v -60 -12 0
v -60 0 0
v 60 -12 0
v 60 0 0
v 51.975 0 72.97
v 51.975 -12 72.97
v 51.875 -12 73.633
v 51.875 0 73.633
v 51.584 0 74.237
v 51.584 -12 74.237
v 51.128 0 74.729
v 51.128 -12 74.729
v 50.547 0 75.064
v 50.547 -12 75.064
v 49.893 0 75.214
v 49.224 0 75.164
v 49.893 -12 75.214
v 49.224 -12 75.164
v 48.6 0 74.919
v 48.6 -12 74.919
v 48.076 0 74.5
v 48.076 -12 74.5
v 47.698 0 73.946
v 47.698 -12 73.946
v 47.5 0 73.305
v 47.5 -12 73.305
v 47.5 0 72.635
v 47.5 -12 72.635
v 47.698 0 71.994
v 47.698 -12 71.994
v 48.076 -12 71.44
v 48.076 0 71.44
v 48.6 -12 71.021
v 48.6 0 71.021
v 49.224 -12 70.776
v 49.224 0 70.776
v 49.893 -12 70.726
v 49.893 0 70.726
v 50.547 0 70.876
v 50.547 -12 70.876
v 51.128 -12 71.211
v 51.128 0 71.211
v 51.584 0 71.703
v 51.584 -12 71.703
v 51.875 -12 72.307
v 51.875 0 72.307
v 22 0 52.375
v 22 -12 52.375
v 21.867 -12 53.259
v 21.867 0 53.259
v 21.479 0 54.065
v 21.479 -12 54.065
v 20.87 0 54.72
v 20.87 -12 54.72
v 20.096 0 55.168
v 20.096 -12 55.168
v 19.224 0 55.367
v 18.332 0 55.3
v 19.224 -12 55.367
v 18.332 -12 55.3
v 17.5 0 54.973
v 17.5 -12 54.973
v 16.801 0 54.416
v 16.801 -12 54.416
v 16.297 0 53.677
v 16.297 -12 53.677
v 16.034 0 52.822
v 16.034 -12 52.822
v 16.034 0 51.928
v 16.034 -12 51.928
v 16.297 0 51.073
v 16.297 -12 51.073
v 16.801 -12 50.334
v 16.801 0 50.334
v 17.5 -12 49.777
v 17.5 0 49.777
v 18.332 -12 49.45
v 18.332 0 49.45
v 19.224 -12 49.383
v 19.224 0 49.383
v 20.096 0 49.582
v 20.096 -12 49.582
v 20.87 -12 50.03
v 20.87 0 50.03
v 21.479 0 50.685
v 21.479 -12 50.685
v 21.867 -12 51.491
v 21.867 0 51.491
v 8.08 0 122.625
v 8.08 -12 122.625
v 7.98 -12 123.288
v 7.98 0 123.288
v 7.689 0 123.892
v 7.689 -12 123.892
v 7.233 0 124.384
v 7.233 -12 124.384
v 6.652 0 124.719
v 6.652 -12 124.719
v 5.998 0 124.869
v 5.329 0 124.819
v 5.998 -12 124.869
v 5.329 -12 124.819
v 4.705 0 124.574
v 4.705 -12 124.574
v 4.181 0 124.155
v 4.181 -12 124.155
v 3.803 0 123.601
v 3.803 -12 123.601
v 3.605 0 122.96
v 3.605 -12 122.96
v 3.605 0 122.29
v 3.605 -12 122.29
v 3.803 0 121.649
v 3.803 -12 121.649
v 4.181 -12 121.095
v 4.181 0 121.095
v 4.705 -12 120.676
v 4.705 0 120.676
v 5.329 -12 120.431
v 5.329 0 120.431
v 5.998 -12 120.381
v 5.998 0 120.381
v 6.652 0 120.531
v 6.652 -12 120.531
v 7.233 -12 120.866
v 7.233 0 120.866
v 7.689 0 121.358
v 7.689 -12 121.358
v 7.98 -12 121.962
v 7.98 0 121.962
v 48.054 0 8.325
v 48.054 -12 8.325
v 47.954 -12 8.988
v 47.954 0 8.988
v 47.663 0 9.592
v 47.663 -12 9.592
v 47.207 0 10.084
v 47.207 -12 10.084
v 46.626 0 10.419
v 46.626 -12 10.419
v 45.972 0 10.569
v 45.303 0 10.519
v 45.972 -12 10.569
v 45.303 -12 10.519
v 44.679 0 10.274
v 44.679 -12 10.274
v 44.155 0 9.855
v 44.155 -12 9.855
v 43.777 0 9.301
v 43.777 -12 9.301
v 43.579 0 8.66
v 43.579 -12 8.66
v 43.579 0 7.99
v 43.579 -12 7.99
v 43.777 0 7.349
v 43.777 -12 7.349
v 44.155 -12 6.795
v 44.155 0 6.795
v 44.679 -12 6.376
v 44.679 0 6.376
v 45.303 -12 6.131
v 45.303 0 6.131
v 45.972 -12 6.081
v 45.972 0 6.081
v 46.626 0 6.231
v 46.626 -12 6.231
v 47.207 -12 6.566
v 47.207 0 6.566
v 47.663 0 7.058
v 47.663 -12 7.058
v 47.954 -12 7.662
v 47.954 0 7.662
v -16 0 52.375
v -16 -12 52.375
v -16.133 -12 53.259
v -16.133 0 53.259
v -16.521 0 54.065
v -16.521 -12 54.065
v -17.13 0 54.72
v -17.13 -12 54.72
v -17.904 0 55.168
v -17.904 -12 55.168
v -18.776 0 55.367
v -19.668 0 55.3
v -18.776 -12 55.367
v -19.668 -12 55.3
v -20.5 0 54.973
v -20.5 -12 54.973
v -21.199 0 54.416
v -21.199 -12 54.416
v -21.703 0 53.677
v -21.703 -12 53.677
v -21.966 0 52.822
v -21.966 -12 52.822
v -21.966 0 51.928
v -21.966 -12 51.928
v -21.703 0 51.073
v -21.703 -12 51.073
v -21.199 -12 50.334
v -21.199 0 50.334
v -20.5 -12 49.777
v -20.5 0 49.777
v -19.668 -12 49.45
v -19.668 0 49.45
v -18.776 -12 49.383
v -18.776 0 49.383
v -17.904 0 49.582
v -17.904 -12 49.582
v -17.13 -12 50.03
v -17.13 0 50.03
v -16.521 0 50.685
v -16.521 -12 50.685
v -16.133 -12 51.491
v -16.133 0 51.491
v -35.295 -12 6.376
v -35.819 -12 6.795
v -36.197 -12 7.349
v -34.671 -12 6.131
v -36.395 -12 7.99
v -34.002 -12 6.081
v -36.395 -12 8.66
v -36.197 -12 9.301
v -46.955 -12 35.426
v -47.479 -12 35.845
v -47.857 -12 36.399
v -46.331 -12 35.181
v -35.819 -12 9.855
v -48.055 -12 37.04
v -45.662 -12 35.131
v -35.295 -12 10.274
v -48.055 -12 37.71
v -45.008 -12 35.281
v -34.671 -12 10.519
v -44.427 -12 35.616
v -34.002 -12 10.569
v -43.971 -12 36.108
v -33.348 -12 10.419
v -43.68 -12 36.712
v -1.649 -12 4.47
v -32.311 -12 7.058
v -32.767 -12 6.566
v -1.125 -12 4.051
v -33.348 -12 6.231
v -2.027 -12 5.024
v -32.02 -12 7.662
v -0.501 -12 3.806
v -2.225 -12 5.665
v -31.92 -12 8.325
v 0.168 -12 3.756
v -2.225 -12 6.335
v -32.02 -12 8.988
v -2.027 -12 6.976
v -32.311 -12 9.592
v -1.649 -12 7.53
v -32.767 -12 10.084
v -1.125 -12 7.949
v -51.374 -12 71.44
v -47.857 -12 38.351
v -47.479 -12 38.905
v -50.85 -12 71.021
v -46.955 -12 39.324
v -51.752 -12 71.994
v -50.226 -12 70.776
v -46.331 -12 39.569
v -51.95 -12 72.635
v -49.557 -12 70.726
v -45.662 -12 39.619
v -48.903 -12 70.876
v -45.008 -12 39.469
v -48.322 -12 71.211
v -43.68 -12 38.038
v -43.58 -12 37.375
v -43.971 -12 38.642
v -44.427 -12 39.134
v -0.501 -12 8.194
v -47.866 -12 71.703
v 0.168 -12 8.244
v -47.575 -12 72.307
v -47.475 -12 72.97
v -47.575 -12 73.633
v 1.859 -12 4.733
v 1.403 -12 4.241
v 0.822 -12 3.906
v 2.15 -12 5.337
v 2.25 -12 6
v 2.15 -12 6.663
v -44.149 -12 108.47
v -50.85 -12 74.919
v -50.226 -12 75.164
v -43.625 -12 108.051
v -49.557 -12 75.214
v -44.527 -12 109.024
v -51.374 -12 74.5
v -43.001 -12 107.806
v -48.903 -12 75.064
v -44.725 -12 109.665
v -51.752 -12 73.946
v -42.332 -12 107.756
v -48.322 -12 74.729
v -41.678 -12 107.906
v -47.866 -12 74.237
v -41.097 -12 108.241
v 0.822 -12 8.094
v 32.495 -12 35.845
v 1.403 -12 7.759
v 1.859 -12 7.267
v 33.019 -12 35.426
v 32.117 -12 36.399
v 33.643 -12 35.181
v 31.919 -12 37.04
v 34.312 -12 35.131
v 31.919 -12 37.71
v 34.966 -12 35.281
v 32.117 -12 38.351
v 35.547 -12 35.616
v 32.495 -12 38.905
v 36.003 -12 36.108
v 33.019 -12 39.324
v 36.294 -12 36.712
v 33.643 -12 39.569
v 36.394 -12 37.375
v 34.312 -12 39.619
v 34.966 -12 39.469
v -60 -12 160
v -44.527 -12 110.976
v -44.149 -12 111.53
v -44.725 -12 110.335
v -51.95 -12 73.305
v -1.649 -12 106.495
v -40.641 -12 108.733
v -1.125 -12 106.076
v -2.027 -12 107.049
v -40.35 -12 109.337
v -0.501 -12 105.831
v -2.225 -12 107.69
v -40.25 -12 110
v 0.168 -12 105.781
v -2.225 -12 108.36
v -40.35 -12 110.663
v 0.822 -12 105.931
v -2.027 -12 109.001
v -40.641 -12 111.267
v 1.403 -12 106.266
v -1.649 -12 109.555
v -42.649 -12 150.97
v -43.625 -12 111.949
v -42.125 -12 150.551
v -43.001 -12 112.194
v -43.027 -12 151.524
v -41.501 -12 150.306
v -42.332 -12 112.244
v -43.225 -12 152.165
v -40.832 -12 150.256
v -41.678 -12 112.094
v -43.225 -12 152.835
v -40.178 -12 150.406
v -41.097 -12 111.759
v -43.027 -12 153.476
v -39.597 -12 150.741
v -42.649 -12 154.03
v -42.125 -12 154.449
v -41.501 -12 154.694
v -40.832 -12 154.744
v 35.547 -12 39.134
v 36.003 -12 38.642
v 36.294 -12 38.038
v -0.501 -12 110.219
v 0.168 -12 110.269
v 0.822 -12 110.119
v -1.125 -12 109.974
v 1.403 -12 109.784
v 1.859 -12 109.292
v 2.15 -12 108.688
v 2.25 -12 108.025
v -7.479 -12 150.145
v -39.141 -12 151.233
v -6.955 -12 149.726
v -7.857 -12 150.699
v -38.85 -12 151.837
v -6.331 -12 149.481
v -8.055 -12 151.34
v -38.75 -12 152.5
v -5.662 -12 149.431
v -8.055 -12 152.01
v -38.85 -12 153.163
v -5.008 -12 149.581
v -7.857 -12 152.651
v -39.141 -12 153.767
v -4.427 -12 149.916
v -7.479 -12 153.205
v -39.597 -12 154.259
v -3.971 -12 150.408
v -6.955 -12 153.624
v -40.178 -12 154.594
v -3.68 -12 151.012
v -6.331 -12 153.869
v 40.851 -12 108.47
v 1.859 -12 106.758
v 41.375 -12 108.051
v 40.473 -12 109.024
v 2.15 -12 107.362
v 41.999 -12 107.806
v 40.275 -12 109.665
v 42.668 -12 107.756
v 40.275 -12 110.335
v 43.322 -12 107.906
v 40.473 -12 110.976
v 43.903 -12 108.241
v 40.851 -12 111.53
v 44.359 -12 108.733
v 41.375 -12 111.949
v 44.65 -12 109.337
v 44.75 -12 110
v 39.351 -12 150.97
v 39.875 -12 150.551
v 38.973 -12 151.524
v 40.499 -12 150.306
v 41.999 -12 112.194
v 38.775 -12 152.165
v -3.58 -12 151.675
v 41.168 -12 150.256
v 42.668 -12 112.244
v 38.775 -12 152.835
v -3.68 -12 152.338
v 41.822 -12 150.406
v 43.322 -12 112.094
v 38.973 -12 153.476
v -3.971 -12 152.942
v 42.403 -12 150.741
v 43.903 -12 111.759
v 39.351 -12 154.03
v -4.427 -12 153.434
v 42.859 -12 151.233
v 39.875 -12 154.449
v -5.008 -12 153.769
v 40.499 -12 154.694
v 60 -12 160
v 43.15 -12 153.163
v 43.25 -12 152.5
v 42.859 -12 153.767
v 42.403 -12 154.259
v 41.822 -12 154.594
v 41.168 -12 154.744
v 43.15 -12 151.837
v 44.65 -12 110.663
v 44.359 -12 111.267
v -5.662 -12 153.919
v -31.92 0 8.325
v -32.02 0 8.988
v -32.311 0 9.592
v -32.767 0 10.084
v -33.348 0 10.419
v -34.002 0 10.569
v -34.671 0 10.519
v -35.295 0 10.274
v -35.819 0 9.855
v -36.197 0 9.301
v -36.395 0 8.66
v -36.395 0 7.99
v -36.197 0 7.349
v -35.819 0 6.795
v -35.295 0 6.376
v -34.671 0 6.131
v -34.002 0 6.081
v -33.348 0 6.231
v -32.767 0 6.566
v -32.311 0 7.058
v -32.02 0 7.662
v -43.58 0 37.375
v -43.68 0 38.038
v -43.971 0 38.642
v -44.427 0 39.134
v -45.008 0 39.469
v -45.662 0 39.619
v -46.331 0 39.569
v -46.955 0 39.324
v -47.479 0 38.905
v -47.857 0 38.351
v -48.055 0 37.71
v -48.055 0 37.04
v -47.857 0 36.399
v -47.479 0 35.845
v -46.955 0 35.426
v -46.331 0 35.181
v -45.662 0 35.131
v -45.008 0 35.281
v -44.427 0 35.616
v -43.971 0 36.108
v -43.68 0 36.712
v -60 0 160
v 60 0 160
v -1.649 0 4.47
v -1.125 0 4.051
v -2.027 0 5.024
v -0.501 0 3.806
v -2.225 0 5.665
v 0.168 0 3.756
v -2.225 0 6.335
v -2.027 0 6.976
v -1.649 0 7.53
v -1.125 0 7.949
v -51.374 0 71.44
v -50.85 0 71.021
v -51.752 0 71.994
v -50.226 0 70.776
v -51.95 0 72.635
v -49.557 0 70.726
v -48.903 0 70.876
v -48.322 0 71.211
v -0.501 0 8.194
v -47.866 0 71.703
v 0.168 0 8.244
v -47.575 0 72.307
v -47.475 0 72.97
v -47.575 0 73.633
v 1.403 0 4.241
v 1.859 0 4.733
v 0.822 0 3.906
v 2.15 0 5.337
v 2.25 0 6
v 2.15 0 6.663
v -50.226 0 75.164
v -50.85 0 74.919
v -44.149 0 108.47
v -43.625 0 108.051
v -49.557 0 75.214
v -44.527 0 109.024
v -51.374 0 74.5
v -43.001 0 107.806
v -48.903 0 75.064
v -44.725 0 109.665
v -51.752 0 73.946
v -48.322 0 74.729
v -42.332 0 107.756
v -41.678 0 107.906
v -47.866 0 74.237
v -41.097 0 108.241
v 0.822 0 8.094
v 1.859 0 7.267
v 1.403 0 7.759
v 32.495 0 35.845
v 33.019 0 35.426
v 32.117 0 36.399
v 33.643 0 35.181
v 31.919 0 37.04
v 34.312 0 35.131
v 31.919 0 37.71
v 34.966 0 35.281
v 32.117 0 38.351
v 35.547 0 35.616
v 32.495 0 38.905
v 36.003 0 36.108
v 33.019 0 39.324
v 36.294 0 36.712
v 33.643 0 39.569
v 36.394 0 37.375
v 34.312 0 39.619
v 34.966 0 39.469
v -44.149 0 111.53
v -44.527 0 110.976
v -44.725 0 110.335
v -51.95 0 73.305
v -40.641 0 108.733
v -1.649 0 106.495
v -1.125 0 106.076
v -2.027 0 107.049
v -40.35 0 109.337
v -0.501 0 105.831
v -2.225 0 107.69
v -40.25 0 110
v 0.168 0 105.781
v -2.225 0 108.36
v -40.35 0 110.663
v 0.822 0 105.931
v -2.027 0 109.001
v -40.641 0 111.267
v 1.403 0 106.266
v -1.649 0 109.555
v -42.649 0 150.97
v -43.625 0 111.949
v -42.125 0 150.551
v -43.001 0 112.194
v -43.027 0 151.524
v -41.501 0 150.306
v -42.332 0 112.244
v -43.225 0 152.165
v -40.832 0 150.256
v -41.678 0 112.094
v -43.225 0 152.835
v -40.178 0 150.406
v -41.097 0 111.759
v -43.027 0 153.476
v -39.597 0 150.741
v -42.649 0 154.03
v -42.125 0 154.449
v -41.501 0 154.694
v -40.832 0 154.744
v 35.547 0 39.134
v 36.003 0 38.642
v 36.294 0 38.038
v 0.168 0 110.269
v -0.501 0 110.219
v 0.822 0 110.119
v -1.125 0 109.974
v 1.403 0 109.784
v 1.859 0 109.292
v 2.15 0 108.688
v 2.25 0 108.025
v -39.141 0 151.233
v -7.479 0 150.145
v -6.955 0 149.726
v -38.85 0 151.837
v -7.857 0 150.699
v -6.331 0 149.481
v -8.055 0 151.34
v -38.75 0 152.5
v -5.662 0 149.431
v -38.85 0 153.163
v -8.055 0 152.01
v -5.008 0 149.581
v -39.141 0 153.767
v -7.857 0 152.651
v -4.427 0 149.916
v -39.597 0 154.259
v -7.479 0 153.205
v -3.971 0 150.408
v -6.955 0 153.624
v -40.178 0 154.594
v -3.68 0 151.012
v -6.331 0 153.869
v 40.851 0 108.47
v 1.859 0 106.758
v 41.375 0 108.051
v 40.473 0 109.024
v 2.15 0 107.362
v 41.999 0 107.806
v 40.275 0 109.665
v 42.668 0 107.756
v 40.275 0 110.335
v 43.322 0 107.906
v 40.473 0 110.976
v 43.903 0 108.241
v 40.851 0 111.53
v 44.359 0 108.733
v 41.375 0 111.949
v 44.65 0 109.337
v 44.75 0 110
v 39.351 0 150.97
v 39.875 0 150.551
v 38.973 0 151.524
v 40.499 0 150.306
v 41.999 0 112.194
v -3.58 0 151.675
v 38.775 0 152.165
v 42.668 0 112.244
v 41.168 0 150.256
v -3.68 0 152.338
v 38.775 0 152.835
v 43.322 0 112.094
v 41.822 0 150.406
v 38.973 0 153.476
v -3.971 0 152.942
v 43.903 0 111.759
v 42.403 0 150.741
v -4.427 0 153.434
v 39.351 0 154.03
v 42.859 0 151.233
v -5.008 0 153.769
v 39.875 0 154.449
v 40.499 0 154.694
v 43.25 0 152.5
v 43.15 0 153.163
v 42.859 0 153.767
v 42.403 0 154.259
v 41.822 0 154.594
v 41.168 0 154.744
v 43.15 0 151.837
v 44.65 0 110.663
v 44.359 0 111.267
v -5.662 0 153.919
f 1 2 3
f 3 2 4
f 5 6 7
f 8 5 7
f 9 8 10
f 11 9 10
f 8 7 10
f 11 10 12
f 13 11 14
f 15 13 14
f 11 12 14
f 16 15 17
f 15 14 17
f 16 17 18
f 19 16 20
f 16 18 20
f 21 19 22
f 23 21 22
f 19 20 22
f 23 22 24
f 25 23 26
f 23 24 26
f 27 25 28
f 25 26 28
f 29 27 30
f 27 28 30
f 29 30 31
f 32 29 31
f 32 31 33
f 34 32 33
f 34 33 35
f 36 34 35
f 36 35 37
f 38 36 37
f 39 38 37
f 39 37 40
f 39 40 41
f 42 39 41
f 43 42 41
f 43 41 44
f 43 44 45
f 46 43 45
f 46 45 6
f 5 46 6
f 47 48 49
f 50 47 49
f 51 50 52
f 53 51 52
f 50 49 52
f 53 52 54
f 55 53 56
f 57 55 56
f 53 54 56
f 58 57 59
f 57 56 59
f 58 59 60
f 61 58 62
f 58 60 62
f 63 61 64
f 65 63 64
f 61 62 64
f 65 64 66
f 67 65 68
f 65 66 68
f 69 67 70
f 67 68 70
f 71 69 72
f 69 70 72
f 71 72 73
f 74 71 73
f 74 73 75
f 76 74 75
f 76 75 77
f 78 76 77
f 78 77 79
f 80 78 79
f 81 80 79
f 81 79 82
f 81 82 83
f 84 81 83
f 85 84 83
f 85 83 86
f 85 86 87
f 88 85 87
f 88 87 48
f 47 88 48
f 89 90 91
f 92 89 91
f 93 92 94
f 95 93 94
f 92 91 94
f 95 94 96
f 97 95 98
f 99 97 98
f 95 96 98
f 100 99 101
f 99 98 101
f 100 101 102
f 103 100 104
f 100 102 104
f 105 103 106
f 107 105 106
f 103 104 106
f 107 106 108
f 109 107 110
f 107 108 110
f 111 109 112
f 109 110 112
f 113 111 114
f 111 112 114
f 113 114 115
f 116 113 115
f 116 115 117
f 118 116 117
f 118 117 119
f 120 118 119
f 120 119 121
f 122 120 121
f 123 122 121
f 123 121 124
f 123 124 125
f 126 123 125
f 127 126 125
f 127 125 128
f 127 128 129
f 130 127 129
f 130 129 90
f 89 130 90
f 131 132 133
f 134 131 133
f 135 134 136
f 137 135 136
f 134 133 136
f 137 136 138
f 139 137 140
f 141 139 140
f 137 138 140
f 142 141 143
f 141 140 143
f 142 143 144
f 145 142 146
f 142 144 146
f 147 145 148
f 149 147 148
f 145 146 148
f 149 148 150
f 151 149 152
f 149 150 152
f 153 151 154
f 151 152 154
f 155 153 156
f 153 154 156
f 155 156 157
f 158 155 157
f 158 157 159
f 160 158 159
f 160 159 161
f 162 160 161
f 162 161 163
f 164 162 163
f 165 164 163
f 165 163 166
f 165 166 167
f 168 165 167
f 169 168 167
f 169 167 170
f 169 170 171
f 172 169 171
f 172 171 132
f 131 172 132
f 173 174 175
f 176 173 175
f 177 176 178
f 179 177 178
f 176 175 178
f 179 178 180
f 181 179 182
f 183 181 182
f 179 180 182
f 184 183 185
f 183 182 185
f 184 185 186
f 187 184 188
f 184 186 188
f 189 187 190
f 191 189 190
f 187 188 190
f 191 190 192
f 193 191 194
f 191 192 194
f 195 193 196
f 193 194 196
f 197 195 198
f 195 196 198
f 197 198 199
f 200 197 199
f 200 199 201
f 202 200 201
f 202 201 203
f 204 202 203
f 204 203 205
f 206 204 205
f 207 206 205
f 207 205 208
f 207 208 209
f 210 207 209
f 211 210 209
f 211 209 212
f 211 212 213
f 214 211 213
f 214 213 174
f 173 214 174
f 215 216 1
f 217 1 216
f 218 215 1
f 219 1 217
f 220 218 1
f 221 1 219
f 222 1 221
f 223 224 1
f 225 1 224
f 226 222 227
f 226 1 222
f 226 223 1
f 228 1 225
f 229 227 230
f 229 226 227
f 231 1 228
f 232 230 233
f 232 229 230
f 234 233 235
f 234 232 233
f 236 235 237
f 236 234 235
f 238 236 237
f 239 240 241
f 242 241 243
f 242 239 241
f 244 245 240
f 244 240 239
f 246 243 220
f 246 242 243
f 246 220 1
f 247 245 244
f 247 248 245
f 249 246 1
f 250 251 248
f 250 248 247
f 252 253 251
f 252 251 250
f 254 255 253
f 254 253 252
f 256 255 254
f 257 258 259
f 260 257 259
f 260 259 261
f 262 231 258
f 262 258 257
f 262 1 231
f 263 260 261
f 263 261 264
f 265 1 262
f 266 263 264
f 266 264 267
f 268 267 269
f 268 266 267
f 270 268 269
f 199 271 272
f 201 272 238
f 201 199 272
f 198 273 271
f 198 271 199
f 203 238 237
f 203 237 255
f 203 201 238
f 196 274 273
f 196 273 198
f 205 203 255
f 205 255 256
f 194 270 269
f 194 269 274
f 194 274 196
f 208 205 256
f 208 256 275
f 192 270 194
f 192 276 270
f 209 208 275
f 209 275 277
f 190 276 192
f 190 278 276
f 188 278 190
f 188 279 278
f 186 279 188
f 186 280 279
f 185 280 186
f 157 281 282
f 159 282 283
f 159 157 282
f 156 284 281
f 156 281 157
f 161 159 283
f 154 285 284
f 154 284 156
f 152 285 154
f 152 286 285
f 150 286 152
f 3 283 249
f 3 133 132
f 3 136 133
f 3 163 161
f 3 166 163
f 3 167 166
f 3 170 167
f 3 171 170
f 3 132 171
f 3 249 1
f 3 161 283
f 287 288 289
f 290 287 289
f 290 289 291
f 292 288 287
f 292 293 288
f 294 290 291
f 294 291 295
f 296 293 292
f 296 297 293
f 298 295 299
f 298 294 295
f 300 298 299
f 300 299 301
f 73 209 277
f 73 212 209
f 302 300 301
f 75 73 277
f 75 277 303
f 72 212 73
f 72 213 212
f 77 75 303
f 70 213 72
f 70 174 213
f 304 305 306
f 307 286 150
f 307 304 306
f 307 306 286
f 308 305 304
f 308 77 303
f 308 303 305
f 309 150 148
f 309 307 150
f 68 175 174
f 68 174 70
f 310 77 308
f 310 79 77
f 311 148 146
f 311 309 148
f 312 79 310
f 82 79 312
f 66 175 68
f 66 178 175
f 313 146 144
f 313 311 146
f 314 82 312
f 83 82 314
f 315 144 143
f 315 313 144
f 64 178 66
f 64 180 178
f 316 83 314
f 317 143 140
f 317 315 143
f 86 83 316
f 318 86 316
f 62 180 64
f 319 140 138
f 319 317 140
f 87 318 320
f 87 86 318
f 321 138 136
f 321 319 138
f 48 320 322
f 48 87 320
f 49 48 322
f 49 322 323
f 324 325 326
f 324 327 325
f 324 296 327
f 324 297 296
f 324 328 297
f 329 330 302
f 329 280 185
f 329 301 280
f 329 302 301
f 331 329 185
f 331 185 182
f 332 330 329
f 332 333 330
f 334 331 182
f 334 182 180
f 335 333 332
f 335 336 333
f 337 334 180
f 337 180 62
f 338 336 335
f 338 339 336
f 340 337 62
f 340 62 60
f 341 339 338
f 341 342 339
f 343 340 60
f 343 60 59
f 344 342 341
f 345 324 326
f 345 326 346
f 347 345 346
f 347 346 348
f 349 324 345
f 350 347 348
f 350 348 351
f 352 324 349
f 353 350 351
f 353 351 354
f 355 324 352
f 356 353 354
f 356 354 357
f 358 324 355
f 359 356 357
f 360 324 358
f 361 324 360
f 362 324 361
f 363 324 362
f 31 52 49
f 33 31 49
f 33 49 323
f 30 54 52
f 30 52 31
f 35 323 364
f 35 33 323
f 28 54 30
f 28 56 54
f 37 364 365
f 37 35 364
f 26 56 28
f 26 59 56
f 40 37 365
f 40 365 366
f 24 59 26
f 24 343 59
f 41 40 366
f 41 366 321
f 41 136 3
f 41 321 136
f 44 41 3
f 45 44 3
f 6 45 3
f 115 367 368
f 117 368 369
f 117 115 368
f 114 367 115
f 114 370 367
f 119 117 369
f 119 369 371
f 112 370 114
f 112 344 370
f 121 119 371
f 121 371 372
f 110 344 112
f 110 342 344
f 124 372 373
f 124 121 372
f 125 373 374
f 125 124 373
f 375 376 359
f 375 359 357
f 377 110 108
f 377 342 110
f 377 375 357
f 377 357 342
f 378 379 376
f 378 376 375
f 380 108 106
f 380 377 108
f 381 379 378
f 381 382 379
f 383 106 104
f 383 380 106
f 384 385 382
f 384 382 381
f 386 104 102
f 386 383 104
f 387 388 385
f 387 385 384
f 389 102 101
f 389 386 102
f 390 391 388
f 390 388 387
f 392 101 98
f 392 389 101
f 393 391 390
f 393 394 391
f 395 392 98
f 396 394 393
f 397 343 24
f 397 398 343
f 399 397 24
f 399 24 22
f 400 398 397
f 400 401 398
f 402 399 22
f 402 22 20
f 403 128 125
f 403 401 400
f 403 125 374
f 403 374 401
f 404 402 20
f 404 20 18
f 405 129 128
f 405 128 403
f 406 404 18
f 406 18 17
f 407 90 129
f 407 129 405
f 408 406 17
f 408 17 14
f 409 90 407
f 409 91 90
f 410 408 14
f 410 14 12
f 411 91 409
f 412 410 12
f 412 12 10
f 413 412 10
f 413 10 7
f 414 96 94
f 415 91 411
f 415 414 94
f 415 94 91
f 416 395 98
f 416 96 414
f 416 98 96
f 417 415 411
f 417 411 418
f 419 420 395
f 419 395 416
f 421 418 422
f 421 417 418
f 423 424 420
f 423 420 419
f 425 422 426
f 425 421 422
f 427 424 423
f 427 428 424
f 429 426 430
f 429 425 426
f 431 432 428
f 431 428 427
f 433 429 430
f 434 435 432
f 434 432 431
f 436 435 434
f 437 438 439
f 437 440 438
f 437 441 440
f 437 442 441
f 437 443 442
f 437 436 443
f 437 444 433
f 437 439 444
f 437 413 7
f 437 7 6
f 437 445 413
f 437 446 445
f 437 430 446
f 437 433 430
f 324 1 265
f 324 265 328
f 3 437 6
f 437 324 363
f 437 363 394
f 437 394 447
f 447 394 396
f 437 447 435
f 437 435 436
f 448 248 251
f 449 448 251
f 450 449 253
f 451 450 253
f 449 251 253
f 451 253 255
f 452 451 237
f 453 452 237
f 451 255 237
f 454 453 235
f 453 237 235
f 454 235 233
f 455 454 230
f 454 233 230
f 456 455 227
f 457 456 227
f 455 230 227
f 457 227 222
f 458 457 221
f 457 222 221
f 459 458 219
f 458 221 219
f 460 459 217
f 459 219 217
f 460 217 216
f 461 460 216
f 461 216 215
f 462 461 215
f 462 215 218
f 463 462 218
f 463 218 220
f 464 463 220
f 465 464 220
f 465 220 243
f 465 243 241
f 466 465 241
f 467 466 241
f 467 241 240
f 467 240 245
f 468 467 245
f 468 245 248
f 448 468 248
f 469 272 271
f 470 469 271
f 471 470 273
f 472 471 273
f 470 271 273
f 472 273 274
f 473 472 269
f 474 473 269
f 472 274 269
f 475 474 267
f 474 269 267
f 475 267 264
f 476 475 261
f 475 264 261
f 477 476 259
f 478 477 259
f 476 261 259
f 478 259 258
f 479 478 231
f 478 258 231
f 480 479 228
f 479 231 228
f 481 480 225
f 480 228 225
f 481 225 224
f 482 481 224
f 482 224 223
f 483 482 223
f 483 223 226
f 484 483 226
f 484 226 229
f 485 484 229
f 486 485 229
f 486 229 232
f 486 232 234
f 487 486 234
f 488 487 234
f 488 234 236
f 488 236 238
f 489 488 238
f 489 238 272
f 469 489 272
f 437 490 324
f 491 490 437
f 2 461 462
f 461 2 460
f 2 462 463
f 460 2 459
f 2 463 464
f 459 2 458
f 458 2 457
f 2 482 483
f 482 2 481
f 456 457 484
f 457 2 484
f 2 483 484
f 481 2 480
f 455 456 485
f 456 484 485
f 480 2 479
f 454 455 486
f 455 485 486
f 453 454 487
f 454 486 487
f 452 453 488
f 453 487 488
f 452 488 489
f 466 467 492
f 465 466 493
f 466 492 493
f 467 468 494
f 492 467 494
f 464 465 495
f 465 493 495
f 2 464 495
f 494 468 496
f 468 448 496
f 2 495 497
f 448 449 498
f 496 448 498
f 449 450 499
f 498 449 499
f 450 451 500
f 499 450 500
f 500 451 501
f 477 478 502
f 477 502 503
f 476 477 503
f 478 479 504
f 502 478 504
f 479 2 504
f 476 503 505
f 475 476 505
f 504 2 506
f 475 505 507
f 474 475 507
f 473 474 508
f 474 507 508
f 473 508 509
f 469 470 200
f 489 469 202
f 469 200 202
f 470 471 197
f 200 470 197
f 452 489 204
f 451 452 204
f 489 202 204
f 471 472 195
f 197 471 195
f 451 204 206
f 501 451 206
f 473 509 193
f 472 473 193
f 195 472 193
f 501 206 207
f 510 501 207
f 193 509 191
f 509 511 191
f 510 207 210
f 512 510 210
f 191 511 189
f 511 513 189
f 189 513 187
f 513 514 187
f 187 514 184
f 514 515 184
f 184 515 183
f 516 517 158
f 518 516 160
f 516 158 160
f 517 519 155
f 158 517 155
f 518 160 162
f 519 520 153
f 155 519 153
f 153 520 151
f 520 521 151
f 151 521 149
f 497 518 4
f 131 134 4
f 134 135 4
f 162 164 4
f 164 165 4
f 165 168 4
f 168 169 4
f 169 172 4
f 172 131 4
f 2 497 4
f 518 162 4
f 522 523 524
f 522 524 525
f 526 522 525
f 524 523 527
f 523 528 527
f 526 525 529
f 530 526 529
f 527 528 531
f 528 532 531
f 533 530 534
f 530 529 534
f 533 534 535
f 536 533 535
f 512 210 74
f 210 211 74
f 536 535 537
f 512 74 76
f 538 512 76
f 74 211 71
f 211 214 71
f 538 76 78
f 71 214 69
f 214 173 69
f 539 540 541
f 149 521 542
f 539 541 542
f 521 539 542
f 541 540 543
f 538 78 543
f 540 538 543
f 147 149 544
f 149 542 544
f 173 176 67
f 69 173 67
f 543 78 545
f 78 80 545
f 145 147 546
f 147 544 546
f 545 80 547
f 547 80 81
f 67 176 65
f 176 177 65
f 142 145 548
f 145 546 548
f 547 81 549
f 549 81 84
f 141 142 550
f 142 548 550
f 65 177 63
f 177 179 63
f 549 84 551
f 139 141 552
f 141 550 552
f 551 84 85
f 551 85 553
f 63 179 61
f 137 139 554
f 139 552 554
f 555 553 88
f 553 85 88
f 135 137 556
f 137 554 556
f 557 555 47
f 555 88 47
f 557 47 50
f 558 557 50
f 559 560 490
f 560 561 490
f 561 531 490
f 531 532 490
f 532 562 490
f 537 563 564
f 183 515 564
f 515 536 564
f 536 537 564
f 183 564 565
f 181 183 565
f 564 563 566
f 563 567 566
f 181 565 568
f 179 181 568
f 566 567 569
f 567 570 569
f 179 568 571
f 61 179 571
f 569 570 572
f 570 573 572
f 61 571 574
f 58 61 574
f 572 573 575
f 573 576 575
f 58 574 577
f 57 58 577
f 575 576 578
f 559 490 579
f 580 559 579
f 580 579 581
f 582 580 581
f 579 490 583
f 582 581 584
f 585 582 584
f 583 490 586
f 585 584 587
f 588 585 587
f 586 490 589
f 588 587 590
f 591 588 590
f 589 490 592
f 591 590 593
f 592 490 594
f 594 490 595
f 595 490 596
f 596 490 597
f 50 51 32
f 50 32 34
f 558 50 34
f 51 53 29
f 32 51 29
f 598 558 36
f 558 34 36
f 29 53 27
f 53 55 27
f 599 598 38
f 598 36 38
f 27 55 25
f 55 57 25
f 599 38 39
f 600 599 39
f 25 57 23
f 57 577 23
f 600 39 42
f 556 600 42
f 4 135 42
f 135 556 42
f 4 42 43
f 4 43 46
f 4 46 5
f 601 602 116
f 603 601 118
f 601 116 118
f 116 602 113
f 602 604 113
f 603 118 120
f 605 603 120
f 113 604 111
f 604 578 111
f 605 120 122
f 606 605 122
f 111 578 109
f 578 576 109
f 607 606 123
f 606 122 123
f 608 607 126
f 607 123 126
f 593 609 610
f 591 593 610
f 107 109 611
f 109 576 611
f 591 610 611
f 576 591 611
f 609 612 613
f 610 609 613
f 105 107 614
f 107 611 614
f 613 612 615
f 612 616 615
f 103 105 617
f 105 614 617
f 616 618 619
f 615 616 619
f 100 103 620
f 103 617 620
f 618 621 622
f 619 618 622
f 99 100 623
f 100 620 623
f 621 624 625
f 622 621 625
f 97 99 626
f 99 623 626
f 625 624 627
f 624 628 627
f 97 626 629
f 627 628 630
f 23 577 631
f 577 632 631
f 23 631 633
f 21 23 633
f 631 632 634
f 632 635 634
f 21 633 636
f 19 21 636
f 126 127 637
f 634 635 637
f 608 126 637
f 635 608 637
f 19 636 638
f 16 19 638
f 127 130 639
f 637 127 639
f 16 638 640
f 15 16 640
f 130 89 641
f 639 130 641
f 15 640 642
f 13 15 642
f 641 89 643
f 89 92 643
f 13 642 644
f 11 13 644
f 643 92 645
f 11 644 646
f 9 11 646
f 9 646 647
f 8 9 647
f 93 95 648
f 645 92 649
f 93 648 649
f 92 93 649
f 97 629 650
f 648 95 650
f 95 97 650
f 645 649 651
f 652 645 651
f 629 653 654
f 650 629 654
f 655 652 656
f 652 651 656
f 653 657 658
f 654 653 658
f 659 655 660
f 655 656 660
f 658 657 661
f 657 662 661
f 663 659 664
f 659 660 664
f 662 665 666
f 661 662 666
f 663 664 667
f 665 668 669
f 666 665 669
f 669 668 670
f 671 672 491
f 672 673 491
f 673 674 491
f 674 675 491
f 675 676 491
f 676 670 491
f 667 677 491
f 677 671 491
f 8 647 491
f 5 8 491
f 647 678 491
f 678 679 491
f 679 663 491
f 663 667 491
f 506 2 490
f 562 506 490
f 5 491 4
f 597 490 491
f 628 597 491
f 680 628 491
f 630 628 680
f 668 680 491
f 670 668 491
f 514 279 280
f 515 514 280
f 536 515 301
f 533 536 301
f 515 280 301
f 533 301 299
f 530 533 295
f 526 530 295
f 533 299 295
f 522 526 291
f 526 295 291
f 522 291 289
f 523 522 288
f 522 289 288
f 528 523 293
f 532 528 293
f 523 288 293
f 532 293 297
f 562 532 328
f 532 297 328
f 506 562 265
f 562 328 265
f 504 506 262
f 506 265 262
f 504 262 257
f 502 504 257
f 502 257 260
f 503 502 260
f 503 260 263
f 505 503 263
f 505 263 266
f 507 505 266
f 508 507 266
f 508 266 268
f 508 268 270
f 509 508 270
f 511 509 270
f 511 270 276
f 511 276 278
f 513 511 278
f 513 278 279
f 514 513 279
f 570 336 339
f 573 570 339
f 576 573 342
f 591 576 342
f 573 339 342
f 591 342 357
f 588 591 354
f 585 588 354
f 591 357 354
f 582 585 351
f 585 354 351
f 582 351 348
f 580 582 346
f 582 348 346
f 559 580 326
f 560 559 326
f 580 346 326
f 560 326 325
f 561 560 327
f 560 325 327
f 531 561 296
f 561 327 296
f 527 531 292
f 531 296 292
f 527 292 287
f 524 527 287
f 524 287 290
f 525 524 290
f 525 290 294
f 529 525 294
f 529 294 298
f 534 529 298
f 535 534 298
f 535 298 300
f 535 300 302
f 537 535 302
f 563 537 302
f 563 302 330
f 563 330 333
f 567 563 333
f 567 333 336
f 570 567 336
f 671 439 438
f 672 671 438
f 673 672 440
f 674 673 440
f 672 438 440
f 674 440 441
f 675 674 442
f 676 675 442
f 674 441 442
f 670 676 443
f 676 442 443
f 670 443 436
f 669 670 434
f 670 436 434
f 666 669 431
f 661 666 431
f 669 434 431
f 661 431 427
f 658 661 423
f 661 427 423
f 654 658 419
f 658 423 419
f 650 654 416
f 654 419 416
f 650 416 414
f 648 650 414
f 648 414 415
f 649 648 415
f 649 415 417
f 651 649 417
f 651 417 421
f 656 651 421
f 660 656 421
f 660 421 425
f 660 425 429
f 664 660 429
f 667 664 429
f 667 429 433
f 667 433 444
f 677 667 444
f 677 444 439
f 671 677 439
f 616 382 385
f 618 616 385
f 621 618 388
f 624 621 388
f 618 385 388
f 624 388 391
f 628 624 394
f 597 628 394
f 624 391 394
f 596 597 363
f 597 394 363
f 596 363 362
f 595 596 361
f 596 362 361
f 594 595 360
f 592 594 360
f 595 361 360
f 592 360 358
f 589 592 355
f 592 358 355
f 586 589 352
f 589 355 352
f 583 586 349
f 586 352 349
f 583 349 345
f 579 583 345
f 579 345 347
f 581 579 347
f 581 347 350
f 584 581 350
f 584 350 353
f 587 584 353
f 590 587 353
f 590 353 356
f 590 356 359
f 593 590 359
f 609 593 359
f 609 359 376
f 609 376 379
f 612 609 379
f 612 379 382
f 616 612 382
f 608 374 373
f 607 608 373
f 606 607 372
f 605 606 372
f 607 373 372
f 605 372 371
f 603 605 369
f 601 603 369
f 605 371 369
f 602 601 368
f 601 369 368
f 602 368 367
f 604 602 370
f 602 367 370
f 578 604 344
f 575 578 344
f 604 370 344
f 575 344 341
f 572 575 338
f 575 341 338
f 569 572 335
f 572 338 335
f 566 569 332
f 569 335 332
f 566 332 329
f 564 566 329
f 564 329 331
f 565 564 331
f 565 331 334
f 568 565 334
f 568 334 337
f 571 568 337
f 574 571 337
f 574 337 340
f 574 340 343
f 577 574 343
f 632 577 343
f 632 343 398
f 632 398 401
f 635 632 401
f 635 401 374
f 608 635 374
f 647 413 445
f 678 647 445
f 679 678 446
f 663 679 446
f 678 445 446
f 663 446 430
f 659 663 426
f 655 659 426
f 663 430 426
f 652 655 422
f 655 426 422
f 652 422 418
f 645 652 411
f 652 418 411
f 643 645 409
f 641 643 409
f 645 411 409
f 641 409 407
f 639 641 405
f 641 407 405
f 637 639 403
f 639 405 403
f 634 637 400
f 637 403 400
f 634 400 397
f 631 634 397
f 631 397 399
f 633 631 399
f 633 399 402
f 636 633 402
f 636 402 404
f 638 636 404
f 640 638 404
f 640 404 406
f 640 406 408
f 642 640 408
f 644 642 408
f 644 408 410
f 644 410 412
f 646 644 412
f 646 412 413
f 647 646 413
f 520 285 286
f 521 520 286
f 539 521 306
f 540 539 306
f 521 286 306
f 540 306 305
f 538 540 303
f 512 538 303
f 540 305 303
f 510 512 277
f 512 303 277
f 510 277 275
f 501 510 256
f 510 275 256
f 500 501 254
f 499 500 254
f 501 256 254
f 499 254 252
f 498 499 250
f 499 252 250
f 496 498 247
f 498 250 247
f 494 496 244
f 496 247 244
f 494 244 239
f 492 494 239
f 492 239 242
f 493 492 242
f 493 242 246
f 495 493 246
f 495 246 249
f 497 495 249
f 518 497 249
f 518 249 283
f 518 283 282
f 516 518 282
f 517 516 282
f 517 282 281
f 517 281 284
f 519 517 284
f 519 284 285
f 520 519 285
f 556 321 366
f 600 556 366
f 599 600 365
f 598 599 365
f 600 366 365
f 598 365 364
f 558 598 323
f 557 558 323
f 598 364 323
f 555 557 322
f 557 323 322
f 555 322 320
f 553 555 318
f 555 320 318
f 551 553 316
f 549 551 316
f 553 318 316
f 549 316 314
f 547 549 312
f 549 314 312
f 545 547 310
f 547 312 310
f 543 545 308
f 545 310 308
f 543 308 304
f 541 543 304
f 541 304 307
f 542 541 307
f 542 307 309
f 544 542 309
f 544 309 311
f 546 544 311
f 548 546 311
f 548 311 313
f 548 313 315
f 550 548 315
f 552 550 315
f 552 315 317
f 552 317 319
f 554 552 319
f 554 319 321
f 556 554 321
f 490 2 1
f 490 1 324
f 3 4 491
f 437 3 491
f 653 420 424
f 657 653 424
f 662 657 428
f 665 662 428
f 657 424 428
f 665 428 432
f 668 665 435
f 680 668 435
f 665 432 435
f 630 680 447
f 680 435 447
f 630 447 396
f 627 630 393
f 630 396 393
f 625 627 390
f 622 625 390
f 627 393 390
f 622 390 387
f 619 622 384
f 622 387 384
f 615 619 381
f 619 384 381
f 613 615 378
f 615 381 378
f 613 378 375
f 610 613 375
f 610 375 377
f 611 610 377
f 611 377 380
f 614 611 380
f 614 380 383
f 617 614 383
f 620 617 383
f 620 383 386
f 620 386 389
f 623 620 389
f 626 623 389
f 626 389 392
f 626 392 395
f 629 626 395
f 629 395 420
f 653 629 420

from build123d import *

# Parameters (mm, degrees)
SKETCH_W      = 120
SKETCH_H      = 160
PAD_DEPTH     = 12
SKETCH001_R   = 2.25
SKETCH001_R_2 = 3
POCKET_DEPTH  = 12.001


with BuildPart() as part:
    # Sketch → Pad (new body)
    with BuildSketch(Plane.XZ):
        with Locations((0, 80)):
            Rectangle(SKETCH_W, SKETCH_H)
    extrude(amount=PAD_DEPTH)

    # Sketch001 → Pocket (cut, through all)
    with BuildSketch(Plane.XZ.offset(12)):
        with Locations((-45.83, 37.375)):
            Circle(SKETCH001_R)
        with Locations((-34.17, 8.325)):
            Circle(SKETCH001_R)
        with Locations((34.144, 37.375)):
            Circle(SKETCH001_R)
        with Locations((45.804, 8.325)):
            Circle(SKETCH001_R)
        with Locations((-5.83, 151.675)):
            Circle(SKETCH001_R)
        with Locations((5.83, 122.625)):
            Circle(SKETCH001_R)
        with Locations((-49.725, 72.97)):
            Circle(SKETCH001_R)
        with Locations((49.725, 72.97)):
            Circle(SKETCH001_R)
        with Locations((0, 108.025)):
            Circle(SKETCH001_R)
        with Locations((-19, 52.375)):
            Circle(SKETCH001_R_2)
        with Locations((19, 52.375)):
            Circle(SKETCH001_R_2)
        with Locations((0, 6)):
            Circle(SKETCH001_R)
        with Locations((-41, 152.5)):
            Circle(SKETCH001_R)
        with Locations((41, 152.5)):
            Circle(SKETCH001_R)
        with Locations((-42.5, 110)):
            Circle(SKETCH001_R)
        with Locations((42.5, 110)):
            Circle(SKETCH001_R)
    extrude(amount=-POCKET_DEPTH, mode=Mode.SUBTRACT)


solid = part.part
